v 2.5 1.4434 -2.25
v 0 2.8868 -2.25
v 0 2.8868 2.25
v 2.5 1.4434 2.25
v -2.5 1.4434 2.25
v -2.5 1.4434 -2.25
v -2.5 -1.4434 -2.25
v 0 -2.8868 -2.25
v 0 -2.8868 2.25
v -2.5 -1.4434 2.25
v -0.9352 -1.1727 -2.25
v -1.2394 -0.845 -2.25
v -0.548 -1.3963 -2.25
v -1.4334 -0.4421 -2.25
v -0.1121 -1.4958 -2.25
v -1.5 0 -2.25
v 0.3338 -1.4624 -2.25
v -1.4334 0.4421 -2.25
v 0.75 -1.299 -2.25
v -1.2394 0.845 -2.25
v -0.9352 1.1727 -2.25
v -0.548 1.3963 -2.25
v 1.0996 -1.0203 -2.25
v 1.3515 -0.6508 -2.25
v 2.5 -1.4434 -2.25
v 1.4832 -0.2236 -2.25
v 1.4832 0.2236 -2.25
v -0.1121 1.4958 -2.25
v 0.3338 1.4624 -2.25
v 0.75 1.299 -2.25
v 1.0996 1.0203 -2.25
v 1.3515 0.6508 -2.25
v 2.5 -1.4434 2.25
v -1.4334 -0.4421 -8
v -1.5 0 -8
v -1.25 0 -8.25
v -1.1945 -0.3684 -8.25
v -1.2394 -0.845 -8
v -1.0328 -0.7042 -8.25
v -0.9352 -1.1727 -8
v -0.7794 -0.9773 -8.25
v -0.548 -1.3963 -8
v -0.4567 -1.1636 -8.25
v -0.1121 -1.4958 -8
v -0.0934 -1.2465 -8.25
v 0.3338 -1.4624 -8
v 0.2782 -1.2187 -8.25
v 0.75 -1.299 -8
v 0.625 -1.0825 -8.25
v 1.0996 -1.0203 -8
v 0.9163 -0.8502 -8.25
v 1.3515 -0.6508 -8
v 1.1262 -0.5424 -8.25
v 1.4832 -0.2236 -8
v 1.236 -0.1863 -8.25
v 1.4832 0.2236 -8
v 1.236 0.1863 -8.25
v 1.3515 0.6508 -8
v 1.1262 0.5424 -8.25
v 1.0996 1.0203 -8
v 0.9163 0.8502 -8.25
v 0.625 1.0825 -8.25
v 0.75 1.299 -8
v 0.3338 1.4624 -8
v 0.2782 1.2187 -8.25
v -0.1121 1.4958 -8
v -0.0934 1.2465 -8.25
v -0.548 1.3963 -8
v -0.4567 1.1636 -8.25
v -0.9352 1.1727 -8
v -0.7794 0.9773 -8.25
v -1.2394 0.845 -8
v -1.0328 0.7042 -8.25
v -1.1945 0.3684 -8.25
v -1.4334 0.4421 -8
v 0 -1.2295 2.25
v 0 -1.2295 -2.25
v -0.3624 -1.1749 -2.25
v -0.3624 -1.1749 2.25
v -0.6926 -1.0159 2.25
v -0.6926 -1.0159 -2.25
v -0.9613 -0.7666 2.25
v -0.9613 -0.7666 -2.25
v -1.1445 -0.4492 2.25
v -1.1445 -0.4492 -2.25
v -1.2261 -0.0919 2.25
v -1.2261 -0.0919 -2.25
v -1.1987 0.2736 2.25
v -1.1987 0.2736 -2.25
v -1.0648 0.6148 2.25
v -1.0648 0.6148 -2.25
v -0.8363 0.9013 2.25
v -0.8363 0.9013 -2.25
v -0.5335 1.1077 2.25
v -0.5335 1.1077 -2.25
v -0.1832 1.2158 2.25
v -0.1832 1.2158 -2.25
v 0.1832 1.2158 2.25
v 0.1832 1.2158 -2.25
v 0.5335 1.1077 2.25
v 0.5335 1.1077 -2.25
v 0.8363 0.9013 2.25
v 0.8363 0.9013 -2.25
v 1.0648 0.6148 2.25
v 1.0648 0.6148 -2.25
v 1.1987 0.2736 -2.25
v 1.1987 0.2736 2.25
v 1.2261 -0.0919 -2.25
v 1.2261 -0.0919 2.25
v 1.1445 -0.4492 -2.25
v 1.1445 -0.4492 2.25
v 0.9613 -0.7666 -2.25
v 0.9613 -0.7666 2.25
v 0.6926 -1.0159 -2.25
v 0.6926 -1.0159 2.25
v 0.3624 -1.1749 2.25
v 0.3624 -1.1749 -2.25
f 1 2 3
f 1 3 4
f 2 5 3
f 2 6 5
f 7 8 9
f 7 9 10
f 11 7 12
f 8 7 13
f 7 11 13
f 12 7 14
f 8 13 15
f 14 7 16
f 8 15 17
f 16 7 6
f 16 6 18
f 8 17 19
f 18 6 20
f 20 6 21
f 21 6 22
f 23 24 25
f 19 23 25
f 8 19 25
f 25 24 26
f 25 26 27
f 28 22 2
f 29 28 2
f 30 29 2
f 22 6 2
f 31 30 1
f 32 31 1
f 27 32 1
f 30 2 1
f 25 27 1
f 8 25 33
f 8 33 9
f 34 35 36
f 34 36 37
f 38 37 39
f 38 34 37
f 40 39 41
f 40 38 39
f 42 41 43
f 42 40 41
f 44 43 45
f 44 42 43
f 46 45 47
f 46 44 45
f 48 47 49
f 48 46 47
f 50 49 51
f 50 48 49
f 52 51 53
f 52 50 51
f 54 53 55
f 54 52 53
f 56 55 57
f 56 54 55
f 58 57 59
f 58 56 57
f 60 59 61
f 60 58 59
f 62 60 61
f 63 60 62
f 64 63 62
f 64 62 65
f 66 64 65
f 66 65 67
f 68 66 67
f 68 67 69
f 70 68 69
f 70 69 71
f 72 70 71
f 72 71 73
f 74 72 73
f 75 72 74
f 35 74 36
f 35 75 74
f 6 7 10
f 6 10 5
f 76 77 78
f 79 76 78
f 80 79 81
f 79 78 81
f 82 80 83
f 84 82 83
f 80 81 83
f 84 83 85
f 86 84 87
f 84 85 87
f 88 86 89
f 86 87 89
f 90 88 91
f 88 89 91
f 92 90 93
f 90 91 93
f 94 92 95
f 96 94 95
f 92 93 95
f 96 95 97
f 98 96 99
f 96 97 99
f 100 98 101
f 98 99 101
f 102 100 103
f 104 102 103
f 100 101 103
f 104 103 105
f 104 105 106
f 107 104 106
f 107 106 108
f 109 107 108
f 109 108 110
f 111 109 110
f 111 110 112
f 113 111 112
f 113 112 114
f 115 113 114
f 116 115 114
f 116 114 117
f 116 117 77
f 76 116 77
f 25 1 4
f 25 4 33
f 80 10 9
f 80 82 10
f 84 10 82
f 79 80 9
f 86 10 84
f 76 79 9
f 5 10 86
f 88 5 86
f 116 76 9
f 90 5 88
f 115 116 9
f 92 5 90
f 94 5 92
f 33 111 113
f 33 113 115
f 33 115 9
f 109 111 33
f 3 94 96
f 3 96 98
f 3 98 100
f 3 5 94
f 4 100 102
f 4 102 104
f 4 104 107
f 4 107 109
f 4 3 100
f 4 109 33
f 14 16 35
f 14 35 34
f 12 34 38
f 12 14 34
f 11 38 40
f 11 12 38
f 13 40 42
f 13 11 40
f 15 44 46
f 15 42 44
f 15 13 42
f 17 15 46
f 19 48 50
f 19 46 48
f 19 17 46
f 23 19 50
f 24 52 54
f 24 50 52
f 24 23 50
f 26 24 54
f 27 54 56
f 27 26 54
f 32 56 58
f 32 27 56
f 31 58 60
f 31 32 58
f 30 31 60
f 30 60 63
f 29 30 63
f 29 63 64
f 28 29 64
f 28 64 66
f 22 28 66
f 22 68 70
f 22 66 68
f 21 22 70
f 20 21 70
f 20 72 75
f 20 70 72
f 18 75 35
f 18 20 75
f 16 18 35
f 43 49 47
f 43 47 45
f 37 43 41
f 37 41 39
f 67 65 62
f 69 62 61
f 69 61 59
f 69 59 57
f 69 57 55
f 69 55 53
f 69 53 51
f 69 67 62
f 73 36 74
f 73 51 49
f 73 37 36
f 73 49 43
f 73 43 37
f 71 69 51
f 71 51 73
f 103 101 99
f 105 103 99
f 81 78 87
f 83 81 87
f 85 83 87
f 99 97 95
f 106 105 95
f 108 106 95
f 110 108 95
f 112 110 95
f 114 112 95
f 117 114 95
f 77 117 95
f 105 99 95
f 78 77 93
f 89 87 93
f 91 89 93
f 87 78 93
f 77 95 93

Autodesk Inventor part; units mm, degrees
ref_plane "YZ Plane" through (0, 0, 0) normal (1, 0, 0) x (0, 1, 0)
ref_plane "XZ Plane" through (0, 0, 0) normal (0, 1, 0) x (-1, 0, 0)
ref_plane "XY Plane" through (0, 0, 0) normal (0, 0, 1) x (1, 0, 0)
sketch "Skizze1" plane through (0, 0, 0) normal (0, 0, 1) x (1, 0, 0)
  line L0 (-2.5, 1.4434) -> (0, 2.8868)
  line L1 (0, 2.8868) -> (2.5, 1.4434)
  line L2 (2.5, 1.4434) -> (2.5, -1.4434)
  line L3 (2.5, -1.4434) -> (0, -2.8868)
  line L4 (0, -2.8868) -> (-2.5, -1.4434)
  line L5 (-2.5, -1.4434) -> (-2.5, 1.4434)
  point P0 (0, 0)
  point P1 (0, 0)
  point P2 (0, 0)
  dimension "d2" = 5
extrude "Extrusion1" add sketch "Skizze1" along normal mid plane 4.5
sketch "Skizze3" plane through (0, 0, 2.25) normal (0, 0, 1) x (1, 0, 0)
  point P0 (0, 0)
  point P1 (0, 0)
hole "Bohrung1" at (0, 0, 2.25) direction (0, 0, -1) diameter 2.459 depth 8.8 tip angle 118 thread size "M3x0.5" class "6H" standard "ISO Metric profile"
sketch "Skizze4" plane through (0, 0, -2.25) normal (0, 0, -1) x (-1, 0, 0)
  circle A0 centre (0, 0) radius 1.5
  dimension "d17" = 3
extrude "Extrusion3" add sketch "Skizze4" along normal blind 6
thread "Gewinde2" size "M3x0.5" class "6g" standard "ISO Metric profile" full length
chamfer "Fase1" distance 0.25 angle 45 1 edges at (1.5, 0, -8.25)
properties part number "standoff (1466814)"
